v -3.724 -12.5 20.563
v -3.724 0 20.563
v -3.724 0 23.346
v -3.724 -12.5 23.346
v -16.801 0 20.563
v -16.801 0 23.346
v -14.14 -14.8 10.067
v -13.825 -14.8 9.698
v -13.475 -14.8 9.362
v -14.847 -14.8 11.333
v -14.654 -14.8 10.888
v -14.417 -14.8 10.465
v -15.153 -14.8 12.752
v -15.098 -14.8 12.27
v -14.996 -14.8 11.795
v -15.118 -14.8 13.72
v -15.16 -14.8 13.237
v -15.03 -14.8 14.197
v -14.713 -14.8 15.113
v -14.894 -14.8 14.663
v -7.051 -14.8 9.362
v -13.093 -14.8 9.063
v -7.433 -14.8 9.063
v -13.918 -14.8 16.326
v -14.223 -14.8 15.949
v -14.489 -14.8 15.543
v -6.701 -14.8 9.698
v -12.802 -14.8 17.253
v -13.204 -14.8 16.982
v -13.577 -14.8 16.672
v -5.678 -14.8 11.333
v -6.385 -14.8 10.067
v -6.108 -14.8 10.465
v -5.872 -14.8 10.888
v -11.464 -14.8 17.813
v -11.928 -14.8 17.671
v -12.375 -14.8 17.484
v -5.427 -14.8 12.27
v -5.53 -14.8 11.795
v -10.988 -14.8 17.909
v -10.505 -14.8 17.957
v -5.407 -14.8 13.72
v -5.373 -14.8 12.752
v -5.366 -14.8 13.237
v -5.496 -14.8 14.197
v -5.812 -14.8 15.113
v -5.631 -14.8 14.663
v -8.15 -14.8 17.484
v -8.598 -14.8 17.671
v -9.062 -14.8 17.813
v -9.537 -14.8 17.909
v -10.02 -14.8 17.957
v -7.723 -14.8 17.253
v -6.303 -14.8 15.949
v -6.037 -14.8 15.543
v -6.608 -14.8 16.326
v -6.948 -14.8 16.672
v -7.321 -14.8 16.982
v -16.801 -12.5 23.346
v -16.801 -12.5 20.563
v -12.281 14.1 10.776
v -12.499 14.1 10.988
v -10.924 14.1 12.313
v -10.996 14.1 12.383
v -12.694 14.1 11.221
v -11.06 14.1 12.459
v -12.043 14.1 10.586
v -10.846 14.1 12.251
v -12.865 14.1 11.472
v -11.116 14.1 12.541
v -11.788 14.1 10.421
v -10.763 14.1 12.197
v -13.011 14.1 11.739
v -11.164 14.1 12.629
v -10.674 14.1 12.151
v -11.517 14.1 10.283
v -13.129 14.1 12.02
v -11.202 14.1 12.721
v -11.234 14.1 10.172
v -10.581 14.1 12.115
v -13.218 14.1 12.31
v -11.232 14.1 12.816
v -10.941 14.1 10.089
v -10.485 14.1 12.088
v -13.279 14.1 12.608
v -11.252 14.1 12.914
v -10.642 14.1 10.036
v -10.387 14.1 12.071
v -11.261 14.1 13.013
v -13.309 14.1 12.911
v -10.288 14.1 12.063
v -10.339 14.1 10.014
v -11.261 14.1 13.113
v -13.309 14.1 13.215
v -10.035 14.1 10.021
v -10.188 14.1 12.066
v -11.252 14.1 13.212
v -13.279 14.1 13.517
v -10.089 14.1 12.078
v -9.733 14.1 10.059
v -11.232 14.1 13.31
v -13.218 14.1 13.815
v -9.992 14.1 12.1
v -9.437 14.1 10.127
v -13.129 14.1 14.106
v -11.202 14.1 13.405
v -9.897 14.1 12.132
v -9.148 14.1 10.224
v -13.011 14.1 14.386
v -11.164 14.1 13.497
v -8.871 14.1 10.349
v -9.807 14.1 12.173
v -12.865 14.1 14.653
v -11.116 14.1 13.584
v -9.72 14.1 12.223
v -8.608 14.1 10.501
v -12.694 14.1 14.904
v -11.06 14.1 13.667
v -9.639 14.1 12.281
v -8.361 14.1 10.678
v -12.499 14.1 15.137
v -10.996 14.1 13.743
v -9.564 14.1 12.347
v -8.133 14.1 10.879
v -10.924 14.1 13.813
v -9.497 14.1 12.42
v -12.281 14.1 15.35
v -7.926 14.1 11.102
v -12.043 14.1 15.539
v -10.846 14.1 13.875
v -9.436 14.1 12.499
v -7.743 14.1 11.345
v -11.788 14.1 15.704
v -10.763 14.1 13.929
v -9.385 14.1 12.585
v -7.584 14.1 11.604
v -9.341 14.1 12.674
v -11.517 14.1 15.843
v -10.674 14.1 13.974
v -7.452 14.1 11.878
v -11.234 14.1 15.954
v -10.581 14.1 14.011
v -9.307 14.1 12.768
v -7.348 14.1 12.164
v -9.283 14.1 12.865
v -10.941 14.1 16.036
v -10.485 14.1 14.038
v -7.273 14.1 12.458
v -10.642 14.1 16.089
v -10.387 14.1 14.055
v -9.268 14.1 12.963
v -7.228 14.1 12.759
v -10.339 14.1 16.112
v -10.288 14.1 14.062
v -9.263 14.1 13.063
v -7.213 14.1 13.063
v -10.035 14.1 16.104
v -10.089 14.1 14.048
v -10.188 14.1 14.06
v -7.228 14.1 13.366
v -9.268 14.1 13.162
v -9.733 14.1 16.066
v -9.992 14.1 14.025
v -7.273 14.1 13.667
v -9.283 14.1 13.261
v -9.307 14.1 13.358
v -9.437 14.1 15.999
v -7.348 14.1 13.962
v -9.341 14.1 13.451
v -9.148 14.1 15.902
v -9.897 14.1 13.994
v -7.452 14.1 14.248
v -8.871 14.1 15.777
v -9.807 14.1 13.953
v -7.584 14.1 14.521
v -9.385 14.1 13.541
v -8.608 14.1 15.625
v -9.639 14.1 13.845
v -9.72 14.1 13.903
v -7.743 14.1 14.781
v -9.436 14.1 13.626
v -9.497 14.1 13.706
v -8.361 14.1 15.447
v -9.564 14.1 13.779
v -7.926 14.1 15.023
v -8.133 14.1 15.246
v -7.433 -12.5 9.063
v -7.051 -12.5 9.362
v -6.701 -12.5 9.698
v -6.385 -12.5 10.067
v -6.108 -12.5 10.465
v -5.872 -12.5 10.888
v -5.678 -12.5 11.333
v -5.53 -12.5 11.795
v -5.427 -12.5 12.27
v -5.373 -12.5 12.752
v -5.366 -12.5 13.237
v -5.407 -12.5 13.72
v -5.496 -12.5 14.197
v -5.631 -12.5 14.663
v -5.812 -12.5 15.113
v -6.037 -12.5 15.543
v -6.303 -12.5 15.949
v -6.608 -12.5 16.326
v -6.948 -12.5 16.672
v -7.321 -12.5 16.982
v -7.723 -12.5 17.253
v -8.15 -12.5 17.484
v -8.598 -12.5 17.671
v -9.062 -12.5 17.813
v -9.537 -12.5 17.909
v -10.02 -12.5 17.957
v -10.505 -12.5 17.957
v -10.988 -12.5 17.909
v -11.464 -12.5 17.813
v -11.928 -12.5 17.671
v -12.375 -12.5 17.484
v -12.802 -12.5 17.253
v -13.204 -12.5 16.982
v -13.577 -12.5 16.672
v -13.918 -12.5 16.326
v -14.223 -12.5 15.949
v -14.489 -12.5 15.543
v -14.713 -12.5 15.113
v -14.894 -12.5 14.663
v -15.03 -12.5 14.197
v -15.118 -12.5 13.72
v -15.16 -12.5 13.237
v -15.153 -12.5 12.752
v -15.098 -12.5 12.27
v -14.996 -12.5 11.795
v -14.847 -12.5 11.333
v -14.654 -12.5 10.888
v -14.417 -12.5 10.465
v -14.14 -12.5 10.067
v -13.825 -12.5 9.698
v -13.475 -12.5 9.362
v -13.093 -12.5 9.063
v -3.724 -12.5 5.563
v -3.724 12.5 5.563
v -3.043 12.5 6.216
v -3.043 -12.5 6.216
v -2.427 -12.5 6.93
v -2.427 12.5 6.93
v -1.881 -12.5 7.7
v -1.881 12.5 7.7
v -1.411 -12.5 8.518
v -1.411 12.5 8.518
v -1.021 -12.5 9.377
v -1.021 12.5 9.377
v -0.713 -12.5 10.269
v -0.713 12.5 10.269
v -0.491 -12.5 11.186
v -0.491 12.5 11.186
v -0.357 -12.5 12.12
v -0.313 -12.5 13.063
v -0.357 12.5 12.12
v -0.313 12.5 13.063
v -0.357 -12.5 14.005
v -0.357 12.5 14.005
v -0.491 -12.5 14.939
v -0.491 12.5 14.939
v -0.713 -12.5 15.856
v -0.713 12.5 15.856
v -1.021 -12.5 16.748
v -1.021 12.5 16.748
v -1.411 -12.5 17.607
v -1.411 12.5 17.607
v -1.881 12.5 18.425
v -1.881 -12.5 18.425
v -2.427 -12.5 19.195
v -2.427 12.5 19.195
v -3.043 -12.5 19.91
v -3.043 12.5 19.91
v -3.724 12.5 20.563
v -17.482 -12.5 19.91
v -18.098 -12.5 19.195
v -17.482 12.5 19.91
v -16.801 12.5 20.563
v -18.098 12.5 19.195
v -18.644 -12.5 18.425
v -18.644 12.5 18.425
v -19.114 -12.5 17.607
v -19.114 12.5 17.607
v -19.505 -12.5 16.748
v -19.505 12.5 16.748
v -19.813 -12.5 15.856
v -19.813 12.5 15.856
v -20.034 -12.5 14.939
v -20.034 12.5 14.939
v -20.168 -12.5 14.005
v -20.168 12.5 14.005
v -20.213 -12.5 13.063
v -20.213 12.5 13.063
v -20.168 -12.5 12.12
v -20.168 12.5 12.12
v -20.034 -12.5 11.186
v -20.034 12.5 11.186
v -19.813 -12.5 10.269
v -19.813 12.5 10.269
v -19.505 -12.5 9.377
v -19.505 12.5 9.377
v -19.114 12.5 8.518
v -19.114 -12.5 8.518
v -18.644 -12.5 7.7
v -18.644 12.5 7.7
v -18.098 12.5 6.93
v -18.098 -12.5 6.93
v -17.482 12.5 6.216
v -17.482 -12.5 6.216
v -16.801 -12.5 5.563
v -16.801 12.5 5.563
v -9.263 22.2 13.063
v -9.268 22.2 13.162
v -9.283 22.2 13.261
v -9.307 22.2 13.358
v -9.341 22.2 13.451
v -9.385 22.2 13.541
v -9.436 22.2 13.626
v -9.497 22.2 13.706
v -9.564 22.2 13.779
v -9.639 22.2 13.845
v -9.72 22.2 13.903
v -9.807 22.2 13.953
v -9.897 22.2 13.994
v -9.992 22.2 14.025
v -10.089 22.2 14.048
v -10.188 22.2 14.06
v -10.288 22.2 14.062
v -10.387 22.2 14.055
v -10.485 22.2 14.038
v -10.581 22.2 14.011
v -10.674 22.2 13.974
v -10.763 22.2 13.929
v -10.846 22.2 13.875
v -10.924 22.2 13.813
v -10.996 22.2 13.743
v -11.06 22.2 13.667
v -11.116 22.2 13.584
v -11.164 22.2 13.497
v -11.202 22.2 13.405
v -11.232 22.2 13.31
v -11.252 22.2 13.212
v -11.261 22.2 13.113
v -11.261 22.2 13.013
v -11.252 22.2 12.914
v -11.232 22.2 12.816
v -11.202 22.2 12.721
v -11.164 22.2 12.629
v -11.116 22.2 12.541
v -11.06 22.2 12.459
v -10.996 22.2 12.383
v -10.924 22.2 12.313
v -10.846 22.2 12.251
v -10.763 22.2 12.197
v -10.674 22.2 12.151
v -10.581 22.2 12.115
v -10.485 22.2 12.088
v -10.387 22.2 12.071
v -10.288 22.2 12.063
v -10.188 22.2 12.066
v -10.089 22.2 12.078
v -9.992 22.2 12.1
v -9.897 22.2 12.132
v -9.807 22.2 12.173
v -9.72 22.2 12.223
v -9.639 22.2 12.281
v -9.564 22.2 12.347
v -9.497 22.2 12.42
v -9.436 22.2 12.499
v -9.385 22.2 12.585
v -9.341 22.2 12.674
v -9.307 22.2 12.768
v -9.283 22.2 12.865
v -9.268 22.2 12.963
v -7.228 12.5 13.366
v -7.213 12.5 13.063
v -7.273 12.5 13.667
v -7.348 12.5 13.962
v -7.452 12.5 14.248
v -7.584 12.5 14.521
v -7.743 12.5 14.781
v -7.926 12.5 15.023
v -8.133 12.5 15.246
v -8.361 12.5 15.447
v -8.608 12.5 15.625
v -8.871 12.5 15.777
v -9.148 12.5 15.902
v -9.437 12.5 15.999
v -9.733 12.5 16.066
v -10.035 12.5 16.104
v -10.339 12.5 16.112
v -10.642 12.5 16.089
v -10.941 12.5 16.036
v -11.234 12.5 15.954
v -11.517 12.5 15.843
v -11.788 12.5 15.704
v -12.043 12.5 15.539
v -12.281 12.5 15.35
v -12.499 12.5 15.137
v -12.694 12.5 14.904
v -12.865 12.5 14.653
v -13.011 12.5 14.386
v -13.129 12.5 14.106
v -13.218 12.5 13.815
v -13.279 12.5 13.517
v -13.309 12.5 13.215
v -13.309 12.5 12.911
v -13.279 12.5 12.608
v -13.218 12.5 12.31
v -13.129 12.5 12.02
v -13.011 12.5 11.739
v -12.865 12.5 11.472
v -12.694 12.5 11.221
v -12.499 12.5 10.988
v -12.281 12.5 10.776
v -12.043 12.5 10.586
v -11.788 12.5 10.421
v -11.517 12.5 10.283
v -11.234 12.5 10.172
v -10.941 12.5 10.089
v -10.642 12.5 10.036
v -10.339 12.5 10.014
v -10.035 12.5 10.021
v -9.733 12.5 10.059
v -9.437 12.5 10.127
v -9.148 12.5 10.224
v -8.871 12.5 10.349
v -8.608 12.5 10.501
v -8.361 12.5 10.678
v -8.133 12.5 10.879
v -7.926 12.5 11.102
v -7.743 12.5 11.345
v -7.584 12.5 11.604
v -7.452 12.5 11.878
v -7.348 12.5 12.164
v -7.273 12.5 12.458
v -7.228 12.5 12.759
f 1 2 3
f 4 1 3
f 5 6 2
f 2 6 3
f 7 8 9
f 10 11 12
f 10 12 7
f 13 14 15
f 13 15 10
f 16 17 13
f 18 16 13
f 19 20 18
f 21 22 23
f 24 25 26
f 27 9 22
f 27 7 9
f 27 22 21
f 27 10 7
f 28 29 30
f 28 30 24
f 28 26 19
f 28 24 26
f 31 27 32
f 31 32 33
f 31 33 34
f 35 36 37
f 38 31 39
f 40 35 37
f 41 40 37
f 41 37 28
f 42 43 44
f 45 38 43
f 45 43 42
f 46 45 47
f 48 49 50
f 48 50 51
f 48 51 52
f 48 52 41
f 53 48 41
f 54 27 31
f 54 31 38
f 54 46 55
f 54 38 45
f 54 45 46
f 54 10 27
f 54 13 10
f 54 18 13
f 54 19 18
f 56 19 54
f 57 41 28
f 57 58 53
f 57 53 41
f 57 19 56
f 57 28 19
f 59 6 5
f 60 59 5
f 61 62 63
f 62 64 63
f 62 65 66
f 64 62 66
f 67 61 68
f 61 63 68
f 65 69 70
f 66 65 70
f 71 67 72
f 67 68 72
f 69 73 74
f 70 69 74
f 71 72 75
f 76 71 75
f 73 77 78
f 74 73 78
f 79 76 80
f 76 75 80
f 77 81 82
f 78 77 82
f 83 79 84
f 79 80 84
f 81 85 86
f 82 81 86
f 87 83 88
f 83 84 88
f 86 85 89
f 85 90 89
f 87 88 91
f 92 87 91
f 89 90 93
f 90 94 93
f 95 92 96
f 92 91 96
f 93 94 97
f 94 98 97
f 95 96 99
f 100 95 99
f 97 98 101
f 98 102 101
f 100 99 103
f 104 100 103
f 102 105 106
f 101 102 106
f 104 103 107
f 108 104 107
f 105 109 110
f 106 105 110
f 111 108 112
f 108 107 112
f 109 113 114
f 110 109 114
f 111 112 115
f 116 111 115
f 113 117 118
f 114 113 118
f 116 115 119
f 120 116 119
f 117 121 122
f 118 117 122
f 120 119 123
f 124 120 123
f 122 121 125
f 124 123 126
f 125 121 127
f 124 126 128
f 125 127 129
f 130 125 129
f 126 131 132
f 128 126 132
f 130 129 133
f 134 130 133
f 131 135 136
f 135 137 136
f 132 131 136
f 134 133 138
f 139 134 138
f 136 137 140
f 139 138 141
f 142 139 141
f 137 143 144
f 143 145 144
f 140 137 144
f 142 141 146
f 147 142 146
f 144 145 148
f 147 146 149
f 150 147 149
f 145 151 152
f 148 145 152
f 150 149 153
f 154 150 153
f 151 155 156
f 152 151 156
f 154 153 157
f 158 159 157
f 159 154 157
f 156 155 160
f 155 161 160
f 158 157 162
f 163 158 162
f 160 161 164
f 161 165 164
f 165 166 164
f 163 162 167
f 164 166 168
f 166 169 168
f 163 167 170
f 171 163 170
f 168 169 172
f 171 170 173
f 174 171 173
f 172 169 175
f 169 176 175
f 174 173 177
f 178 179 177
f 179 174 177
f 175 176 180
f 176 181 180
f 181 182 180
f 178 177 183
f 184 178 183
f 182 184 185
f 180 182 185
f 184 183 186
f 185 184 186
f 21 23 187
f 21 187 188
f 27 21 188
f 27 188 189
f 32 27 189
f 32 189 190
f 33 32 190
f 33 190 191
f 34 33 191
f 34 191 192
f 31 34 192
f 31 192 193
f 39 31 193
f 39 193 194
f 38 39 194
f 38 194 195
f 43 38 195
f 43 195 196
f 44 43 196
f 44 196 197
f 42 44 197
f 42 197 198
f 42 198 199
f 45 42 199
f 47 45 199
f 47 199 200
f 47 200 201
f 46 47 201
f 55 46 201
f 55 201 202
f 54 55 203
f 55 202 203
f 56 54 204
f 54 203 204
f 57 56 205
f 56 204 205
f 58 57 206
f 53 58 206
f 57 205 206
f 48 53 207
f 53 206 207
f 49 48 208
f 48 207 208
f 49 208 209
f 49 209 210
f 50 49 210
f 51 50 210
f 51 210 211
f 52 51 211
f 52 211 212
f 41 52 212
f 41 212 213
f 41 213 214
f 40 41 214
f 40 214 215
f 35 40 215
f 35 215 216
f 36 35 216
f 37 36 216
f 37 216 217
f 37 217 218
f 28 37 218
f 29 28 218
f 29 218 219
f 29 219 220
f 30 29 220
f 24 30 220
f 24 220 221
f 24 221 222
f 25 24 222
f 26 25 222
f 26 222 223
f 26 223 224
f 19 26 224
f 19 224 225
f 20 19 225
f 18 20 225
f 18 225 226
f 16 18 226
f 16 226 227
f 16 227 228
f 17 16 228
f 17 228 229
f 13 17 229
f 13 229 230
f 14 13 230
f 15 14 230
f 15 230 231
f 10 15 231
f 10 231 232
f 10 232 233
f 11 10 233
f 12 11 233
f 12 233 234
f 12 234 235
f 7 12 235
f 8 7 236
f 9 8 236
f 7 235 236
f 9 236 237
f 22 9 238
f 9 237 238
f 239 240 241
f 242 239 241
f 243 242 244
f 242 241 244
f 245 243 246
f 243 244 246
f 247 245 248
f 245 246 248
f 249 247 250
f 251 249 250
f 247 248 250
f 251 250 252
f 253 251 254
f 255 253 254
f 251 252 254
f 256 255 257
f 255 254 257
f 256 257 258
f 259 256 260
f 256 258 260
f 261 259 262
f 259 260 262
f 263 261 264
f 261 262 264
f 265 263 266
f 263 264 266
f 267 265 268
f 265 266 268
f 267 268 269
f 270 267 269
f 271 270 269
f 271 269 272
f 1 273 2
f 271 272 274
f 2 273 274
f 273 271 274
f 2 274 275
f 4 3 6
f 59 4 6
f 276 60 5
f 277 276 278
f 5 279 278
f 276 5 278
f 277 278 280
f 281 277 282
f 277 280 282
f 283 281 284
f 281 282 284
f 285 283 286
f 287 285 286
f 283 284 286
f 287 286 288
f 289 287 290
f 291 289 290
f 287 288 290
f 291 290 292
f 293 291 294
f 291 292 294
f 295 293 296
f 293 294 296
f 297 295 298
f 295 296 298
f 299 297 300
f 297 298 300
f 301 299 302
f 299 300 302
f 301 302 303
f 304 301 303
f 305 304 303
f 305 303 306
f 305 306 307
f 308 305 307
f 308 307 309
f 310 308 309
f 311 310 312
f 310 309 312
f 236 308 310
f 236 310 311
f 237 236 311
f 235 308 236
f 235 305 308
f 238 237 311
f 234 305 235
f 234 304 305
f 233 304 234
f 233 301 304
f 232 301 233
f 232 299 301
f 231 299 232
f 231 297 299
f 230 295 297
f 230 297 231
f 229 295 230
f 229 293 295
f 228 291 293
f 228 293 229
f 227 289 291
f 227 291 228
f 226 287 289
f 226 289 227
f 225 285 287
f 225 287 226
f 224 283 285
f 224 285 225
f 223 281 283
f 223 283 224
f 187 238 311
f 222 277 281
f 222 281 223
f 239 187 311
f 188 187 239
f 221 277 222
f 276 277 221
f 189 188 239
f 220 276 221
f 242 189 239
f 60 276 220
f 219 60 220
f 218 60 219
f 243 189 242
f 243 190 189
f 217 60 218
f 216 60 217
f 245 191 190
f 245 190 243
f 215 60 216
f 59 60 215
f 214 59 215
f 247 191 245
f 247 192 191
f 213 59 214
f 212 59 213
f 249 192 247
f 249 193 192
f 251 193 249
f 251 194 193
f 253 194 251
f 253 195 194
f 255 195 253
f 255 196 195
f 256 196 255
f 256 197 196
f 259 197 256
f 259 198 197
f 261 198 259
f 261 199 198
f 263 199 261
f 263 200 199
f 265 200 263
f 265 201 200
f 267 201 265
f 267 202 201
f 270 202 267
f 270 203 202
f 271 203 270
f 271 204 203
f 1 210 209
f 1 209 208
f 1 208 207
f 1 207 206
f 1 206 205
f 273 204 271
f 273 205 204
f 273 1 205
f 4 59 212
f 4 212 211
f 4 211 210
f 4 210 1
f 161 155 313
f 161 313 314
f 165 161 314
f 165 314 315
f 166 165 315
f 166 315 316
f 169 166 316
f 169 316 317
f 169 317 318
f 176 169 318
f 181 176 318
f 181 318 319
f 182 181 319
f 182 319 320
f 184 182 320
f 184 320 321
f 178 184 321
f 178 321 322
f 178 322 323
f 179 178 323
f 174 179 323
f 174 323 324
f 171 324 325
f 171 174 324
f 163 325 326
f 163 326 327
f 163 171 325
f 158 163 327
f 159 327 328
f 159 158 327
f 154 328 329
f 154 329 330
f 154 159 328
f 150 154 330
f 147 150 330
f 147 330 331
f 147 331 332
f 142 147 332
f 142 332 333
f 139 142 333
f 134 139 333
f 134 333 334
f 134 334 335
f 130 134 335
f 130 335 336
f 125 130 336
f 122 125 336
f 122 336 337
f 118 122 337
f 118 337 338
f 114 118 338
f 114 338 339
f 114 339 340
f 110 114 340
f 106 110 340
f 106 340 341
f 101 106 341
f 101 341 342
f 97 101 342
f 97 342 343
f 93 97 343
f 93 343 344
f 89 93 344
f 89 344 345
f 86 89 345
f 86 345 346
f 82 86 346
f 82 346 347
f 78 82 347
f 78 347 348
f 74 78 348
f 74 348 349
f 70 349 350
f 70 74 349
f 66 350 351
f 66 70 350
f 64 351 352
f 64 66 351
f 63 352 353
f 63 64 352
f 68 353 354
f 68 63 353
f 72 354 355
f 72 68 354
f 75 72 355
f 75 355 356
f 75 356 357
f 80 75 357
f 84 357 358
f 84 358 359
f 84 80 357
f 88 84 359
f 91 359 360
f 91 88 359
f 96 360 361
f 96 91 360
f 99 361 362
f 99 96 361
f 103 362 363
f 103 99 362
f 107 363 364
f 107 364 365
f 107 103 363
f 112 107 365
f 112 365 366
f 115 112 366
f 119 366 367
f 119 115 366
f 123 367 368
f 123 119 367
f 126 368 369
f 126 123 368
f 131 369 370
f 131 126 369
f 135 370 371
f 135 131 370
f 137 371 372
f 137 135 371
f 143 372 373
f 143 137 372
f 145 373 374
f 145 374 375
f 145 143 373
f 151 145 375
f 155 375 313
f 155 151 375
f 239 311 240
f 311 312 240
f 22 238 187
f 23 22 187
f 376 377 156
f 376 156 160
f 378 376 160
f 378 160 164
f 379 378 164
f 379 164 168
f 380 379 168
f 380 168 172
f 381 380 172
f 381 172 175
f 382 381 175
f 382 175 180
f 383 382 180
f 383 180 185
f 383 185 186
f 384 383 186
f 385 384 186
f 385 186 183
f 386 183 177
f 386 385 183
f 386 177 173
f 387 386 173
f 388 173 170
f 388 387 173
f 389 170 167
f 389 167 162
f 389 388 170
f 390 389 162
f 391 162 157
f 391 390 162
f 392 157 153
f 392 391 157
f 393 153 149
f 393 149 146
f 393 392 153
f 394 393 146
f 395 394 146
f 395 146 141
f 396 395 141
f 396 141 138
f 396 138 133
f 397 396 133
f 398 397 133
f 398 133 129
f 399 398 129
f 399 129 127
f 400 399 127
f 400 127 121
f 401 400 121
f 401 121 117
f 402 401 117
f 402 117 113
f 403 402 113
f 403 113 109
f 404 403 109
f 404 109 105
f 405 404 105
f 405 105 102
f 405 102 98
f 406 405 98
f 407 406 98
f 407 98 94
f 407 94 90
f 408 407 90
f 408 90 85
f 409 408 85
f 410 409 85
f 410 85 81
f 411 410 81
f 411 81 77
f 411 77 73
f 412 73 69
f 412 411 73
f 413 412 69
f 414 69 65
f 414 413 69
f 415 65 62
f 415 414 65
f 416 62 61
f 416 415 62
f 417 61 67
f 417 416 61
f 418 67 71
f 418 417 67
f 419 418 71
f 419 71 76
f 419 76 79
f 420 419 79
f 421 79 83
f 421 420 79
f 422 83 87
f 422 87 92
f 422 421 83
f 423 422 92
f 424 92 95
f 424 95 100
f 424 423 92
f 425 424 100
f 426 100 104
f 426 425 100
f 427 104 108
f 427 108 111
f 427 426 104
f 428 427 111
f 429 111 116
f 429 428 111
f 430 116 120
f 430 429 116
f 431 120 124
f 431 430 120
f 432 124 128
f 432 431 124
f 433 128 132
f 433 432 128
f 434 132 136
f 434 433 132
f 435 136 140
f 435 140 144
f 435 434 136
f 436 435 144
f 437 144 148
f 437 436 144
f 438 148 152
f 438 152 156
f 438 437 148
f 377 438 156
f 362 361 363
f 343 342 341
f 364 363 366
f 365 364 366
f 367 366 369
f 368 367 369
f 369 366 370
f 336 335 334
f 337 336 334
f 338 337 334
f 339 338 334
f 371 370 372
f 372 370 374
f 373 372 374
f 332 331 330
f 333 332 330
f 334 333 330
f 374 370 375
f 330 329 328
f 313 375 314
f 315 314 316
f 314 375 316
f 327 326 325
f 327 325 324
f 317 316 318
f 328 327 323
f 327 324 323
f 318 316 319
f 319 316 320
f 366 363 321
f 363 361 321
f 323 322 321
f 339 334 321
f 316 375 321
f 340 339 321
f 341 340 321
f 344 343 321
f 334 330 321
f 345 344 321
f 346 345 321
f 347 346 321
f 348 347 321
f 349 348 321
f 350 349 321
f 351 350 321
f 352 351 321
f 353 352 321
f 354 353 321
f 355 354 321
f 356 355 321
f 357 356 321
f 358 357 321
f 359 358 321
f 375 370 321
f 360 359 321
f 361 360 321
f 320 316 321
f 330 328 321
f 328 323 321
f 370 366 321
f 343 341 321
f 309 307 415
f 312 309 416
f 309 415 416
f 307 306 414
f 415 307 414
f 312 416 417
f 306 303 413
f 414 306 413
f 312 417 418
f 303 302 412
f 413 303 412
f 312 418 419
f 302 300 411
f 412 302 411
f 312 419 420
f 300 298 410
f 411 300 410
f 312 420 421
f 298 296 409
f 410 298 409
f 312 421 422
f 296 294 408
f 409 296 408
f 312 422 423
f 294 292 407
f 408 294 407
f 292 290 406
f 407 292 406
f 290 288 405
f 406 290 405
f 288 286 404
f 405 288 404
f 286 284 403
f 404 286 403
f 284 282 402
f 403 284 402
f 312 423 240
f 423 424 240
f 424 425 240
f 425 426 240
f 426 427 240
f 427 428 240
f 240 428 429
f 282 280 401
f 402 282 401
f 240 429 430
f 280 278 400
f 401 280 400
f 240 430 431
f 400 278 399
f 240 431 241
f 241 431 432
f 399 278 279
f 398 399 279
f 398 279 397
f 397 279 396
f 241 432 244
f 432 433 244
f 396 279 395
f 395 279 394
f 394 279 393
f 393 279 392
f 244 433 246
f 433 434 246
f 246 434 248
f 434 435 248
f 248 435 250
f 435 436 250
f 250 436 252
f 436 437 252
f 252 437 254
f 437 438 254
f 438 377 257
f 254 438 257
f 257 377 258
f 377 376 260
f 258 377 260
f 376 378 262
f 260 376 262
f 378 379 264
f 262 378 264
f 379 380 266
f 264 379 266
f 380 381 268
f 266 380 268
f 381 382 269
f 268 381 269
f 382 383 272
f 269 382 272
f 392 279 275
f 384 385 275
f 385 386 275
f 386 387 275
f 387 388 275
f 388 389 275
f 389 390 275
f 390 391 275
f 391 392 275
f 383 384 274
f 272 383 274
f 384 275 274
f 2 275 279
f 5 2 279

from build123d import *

# Parameters (mm, degrees)
F0_R     = 3.05
F0_R_2   = 1
F1_DEPTH = 12.5
F2_DEPTH = 12.5
F3_DEPTH = 14.8
F4_DEPTH = 14.1
F5_DEPTH = 22.2


with BuildPart() as f1:
    # F0 (on Front) → F1 (new body, symmetric)
    with BuildSketch(Plane.XZ):
        with BuildLine():
            Line((-3.724197, 20.562796), (-16.801276, 20.562796))
            ThreePointArc((-16.801276, 20.562796), (-20.212736, 13.062796), (-16.801276, 5.562796))
            Line((-16.801276, 5.562796), (-3.724197, 5.562796))
            ThreePointArc((-3.724197, 5.562796), (-0.312736, 13.062796), (-3.724197, 20.562796))
        make_face()
        with BuildLine():
            ThreePointArc((-13.092931, 9.062796), (-10.262736, 17.962796), (-7.432542, 9.062796))
            Line((-7.432542, 9.062796), (-13.092931, 9.062796))
        make_face(mode=Mode.SUBTRACT)
        with Locations((-10.262736, 13.062796)):
            Circle(F0_R)
        with Locations((-10.262736, 13.062796)):
            Circle(F0_R_2, mode=Mode.SUBTRACT)
        with BuildLine():
            Line((-13.092931, 9.062796), (-7.432542, 9.062796))
            ThreePointArc((-7.432542, 9.062796), (-10.262736, 17.962796), (-13.092931, 9.062796))
        make_face()
        with Locations((-10.262736, 13.062796)):
            Circle(F0_R, mode=Mode.SUBTRACT)
        with Locations((-10.262736, 13.062796)):
            Circle(F0_R_2)
    extrude(amount=F1_DEPTH, both=True)

    # F0 (on Front) → F2 (join)
    with BuildSketch(Plane.XZ):
        Polygon((-16.801197, 23.346301), (-16.801276, 20.562796), (-3.724197, 20.562796), (-3.724197, 23.346301), align=None)
    extrude(amount=F2_DEPTH)

    # F0 (on Front) → F3 (join)
    with BuildSketch(Plane.XZ):
        with BuildLine():
            Line((-13.092931, 9.062796), (-7.432542, 9.062796))
            ThreePointArc((-7.432542, 9.062796), (-10.262736, 17.962796), (-13.092931, 9.062796))
        make_face()
        with Locations((-10.262736, 13.062796)):
            Circle(F0_R, mode=Mode.SUBTRACT)
        with Locations((-10.262736, 13.062796)):
            Circle(F0_R)
        with Locations((-10.262736, 13.062796)):
            Circle(F0_R_2, mode=Mode.SUBTRACT)
        with Locations((-10.262736, 13.062796)):
            Circle(F0_R_2)
    extrude(amount=F3_DEPTH)

    # F0 (on Front) → F4 (join)
    with BuildSketch(Plane.XZ):
        with Locations((-10.262736, 13.062796)):
            Circle(F0_R)
        with Locations((-10.262736, 13.062796)):
            Circle(F0_R_2, mode=Mode.SUBTRACT)
    extrude(amount=-F4_DEPTH)

    # F0 (on Front) → F5 (join)
    with BuildSketch(Plane.XZ):
        with Locations((-10.262736, 13.062796)):
            Circle(F0_R_2)
    extrude(amount=-F5_DEPTH)


solid = f1.part
